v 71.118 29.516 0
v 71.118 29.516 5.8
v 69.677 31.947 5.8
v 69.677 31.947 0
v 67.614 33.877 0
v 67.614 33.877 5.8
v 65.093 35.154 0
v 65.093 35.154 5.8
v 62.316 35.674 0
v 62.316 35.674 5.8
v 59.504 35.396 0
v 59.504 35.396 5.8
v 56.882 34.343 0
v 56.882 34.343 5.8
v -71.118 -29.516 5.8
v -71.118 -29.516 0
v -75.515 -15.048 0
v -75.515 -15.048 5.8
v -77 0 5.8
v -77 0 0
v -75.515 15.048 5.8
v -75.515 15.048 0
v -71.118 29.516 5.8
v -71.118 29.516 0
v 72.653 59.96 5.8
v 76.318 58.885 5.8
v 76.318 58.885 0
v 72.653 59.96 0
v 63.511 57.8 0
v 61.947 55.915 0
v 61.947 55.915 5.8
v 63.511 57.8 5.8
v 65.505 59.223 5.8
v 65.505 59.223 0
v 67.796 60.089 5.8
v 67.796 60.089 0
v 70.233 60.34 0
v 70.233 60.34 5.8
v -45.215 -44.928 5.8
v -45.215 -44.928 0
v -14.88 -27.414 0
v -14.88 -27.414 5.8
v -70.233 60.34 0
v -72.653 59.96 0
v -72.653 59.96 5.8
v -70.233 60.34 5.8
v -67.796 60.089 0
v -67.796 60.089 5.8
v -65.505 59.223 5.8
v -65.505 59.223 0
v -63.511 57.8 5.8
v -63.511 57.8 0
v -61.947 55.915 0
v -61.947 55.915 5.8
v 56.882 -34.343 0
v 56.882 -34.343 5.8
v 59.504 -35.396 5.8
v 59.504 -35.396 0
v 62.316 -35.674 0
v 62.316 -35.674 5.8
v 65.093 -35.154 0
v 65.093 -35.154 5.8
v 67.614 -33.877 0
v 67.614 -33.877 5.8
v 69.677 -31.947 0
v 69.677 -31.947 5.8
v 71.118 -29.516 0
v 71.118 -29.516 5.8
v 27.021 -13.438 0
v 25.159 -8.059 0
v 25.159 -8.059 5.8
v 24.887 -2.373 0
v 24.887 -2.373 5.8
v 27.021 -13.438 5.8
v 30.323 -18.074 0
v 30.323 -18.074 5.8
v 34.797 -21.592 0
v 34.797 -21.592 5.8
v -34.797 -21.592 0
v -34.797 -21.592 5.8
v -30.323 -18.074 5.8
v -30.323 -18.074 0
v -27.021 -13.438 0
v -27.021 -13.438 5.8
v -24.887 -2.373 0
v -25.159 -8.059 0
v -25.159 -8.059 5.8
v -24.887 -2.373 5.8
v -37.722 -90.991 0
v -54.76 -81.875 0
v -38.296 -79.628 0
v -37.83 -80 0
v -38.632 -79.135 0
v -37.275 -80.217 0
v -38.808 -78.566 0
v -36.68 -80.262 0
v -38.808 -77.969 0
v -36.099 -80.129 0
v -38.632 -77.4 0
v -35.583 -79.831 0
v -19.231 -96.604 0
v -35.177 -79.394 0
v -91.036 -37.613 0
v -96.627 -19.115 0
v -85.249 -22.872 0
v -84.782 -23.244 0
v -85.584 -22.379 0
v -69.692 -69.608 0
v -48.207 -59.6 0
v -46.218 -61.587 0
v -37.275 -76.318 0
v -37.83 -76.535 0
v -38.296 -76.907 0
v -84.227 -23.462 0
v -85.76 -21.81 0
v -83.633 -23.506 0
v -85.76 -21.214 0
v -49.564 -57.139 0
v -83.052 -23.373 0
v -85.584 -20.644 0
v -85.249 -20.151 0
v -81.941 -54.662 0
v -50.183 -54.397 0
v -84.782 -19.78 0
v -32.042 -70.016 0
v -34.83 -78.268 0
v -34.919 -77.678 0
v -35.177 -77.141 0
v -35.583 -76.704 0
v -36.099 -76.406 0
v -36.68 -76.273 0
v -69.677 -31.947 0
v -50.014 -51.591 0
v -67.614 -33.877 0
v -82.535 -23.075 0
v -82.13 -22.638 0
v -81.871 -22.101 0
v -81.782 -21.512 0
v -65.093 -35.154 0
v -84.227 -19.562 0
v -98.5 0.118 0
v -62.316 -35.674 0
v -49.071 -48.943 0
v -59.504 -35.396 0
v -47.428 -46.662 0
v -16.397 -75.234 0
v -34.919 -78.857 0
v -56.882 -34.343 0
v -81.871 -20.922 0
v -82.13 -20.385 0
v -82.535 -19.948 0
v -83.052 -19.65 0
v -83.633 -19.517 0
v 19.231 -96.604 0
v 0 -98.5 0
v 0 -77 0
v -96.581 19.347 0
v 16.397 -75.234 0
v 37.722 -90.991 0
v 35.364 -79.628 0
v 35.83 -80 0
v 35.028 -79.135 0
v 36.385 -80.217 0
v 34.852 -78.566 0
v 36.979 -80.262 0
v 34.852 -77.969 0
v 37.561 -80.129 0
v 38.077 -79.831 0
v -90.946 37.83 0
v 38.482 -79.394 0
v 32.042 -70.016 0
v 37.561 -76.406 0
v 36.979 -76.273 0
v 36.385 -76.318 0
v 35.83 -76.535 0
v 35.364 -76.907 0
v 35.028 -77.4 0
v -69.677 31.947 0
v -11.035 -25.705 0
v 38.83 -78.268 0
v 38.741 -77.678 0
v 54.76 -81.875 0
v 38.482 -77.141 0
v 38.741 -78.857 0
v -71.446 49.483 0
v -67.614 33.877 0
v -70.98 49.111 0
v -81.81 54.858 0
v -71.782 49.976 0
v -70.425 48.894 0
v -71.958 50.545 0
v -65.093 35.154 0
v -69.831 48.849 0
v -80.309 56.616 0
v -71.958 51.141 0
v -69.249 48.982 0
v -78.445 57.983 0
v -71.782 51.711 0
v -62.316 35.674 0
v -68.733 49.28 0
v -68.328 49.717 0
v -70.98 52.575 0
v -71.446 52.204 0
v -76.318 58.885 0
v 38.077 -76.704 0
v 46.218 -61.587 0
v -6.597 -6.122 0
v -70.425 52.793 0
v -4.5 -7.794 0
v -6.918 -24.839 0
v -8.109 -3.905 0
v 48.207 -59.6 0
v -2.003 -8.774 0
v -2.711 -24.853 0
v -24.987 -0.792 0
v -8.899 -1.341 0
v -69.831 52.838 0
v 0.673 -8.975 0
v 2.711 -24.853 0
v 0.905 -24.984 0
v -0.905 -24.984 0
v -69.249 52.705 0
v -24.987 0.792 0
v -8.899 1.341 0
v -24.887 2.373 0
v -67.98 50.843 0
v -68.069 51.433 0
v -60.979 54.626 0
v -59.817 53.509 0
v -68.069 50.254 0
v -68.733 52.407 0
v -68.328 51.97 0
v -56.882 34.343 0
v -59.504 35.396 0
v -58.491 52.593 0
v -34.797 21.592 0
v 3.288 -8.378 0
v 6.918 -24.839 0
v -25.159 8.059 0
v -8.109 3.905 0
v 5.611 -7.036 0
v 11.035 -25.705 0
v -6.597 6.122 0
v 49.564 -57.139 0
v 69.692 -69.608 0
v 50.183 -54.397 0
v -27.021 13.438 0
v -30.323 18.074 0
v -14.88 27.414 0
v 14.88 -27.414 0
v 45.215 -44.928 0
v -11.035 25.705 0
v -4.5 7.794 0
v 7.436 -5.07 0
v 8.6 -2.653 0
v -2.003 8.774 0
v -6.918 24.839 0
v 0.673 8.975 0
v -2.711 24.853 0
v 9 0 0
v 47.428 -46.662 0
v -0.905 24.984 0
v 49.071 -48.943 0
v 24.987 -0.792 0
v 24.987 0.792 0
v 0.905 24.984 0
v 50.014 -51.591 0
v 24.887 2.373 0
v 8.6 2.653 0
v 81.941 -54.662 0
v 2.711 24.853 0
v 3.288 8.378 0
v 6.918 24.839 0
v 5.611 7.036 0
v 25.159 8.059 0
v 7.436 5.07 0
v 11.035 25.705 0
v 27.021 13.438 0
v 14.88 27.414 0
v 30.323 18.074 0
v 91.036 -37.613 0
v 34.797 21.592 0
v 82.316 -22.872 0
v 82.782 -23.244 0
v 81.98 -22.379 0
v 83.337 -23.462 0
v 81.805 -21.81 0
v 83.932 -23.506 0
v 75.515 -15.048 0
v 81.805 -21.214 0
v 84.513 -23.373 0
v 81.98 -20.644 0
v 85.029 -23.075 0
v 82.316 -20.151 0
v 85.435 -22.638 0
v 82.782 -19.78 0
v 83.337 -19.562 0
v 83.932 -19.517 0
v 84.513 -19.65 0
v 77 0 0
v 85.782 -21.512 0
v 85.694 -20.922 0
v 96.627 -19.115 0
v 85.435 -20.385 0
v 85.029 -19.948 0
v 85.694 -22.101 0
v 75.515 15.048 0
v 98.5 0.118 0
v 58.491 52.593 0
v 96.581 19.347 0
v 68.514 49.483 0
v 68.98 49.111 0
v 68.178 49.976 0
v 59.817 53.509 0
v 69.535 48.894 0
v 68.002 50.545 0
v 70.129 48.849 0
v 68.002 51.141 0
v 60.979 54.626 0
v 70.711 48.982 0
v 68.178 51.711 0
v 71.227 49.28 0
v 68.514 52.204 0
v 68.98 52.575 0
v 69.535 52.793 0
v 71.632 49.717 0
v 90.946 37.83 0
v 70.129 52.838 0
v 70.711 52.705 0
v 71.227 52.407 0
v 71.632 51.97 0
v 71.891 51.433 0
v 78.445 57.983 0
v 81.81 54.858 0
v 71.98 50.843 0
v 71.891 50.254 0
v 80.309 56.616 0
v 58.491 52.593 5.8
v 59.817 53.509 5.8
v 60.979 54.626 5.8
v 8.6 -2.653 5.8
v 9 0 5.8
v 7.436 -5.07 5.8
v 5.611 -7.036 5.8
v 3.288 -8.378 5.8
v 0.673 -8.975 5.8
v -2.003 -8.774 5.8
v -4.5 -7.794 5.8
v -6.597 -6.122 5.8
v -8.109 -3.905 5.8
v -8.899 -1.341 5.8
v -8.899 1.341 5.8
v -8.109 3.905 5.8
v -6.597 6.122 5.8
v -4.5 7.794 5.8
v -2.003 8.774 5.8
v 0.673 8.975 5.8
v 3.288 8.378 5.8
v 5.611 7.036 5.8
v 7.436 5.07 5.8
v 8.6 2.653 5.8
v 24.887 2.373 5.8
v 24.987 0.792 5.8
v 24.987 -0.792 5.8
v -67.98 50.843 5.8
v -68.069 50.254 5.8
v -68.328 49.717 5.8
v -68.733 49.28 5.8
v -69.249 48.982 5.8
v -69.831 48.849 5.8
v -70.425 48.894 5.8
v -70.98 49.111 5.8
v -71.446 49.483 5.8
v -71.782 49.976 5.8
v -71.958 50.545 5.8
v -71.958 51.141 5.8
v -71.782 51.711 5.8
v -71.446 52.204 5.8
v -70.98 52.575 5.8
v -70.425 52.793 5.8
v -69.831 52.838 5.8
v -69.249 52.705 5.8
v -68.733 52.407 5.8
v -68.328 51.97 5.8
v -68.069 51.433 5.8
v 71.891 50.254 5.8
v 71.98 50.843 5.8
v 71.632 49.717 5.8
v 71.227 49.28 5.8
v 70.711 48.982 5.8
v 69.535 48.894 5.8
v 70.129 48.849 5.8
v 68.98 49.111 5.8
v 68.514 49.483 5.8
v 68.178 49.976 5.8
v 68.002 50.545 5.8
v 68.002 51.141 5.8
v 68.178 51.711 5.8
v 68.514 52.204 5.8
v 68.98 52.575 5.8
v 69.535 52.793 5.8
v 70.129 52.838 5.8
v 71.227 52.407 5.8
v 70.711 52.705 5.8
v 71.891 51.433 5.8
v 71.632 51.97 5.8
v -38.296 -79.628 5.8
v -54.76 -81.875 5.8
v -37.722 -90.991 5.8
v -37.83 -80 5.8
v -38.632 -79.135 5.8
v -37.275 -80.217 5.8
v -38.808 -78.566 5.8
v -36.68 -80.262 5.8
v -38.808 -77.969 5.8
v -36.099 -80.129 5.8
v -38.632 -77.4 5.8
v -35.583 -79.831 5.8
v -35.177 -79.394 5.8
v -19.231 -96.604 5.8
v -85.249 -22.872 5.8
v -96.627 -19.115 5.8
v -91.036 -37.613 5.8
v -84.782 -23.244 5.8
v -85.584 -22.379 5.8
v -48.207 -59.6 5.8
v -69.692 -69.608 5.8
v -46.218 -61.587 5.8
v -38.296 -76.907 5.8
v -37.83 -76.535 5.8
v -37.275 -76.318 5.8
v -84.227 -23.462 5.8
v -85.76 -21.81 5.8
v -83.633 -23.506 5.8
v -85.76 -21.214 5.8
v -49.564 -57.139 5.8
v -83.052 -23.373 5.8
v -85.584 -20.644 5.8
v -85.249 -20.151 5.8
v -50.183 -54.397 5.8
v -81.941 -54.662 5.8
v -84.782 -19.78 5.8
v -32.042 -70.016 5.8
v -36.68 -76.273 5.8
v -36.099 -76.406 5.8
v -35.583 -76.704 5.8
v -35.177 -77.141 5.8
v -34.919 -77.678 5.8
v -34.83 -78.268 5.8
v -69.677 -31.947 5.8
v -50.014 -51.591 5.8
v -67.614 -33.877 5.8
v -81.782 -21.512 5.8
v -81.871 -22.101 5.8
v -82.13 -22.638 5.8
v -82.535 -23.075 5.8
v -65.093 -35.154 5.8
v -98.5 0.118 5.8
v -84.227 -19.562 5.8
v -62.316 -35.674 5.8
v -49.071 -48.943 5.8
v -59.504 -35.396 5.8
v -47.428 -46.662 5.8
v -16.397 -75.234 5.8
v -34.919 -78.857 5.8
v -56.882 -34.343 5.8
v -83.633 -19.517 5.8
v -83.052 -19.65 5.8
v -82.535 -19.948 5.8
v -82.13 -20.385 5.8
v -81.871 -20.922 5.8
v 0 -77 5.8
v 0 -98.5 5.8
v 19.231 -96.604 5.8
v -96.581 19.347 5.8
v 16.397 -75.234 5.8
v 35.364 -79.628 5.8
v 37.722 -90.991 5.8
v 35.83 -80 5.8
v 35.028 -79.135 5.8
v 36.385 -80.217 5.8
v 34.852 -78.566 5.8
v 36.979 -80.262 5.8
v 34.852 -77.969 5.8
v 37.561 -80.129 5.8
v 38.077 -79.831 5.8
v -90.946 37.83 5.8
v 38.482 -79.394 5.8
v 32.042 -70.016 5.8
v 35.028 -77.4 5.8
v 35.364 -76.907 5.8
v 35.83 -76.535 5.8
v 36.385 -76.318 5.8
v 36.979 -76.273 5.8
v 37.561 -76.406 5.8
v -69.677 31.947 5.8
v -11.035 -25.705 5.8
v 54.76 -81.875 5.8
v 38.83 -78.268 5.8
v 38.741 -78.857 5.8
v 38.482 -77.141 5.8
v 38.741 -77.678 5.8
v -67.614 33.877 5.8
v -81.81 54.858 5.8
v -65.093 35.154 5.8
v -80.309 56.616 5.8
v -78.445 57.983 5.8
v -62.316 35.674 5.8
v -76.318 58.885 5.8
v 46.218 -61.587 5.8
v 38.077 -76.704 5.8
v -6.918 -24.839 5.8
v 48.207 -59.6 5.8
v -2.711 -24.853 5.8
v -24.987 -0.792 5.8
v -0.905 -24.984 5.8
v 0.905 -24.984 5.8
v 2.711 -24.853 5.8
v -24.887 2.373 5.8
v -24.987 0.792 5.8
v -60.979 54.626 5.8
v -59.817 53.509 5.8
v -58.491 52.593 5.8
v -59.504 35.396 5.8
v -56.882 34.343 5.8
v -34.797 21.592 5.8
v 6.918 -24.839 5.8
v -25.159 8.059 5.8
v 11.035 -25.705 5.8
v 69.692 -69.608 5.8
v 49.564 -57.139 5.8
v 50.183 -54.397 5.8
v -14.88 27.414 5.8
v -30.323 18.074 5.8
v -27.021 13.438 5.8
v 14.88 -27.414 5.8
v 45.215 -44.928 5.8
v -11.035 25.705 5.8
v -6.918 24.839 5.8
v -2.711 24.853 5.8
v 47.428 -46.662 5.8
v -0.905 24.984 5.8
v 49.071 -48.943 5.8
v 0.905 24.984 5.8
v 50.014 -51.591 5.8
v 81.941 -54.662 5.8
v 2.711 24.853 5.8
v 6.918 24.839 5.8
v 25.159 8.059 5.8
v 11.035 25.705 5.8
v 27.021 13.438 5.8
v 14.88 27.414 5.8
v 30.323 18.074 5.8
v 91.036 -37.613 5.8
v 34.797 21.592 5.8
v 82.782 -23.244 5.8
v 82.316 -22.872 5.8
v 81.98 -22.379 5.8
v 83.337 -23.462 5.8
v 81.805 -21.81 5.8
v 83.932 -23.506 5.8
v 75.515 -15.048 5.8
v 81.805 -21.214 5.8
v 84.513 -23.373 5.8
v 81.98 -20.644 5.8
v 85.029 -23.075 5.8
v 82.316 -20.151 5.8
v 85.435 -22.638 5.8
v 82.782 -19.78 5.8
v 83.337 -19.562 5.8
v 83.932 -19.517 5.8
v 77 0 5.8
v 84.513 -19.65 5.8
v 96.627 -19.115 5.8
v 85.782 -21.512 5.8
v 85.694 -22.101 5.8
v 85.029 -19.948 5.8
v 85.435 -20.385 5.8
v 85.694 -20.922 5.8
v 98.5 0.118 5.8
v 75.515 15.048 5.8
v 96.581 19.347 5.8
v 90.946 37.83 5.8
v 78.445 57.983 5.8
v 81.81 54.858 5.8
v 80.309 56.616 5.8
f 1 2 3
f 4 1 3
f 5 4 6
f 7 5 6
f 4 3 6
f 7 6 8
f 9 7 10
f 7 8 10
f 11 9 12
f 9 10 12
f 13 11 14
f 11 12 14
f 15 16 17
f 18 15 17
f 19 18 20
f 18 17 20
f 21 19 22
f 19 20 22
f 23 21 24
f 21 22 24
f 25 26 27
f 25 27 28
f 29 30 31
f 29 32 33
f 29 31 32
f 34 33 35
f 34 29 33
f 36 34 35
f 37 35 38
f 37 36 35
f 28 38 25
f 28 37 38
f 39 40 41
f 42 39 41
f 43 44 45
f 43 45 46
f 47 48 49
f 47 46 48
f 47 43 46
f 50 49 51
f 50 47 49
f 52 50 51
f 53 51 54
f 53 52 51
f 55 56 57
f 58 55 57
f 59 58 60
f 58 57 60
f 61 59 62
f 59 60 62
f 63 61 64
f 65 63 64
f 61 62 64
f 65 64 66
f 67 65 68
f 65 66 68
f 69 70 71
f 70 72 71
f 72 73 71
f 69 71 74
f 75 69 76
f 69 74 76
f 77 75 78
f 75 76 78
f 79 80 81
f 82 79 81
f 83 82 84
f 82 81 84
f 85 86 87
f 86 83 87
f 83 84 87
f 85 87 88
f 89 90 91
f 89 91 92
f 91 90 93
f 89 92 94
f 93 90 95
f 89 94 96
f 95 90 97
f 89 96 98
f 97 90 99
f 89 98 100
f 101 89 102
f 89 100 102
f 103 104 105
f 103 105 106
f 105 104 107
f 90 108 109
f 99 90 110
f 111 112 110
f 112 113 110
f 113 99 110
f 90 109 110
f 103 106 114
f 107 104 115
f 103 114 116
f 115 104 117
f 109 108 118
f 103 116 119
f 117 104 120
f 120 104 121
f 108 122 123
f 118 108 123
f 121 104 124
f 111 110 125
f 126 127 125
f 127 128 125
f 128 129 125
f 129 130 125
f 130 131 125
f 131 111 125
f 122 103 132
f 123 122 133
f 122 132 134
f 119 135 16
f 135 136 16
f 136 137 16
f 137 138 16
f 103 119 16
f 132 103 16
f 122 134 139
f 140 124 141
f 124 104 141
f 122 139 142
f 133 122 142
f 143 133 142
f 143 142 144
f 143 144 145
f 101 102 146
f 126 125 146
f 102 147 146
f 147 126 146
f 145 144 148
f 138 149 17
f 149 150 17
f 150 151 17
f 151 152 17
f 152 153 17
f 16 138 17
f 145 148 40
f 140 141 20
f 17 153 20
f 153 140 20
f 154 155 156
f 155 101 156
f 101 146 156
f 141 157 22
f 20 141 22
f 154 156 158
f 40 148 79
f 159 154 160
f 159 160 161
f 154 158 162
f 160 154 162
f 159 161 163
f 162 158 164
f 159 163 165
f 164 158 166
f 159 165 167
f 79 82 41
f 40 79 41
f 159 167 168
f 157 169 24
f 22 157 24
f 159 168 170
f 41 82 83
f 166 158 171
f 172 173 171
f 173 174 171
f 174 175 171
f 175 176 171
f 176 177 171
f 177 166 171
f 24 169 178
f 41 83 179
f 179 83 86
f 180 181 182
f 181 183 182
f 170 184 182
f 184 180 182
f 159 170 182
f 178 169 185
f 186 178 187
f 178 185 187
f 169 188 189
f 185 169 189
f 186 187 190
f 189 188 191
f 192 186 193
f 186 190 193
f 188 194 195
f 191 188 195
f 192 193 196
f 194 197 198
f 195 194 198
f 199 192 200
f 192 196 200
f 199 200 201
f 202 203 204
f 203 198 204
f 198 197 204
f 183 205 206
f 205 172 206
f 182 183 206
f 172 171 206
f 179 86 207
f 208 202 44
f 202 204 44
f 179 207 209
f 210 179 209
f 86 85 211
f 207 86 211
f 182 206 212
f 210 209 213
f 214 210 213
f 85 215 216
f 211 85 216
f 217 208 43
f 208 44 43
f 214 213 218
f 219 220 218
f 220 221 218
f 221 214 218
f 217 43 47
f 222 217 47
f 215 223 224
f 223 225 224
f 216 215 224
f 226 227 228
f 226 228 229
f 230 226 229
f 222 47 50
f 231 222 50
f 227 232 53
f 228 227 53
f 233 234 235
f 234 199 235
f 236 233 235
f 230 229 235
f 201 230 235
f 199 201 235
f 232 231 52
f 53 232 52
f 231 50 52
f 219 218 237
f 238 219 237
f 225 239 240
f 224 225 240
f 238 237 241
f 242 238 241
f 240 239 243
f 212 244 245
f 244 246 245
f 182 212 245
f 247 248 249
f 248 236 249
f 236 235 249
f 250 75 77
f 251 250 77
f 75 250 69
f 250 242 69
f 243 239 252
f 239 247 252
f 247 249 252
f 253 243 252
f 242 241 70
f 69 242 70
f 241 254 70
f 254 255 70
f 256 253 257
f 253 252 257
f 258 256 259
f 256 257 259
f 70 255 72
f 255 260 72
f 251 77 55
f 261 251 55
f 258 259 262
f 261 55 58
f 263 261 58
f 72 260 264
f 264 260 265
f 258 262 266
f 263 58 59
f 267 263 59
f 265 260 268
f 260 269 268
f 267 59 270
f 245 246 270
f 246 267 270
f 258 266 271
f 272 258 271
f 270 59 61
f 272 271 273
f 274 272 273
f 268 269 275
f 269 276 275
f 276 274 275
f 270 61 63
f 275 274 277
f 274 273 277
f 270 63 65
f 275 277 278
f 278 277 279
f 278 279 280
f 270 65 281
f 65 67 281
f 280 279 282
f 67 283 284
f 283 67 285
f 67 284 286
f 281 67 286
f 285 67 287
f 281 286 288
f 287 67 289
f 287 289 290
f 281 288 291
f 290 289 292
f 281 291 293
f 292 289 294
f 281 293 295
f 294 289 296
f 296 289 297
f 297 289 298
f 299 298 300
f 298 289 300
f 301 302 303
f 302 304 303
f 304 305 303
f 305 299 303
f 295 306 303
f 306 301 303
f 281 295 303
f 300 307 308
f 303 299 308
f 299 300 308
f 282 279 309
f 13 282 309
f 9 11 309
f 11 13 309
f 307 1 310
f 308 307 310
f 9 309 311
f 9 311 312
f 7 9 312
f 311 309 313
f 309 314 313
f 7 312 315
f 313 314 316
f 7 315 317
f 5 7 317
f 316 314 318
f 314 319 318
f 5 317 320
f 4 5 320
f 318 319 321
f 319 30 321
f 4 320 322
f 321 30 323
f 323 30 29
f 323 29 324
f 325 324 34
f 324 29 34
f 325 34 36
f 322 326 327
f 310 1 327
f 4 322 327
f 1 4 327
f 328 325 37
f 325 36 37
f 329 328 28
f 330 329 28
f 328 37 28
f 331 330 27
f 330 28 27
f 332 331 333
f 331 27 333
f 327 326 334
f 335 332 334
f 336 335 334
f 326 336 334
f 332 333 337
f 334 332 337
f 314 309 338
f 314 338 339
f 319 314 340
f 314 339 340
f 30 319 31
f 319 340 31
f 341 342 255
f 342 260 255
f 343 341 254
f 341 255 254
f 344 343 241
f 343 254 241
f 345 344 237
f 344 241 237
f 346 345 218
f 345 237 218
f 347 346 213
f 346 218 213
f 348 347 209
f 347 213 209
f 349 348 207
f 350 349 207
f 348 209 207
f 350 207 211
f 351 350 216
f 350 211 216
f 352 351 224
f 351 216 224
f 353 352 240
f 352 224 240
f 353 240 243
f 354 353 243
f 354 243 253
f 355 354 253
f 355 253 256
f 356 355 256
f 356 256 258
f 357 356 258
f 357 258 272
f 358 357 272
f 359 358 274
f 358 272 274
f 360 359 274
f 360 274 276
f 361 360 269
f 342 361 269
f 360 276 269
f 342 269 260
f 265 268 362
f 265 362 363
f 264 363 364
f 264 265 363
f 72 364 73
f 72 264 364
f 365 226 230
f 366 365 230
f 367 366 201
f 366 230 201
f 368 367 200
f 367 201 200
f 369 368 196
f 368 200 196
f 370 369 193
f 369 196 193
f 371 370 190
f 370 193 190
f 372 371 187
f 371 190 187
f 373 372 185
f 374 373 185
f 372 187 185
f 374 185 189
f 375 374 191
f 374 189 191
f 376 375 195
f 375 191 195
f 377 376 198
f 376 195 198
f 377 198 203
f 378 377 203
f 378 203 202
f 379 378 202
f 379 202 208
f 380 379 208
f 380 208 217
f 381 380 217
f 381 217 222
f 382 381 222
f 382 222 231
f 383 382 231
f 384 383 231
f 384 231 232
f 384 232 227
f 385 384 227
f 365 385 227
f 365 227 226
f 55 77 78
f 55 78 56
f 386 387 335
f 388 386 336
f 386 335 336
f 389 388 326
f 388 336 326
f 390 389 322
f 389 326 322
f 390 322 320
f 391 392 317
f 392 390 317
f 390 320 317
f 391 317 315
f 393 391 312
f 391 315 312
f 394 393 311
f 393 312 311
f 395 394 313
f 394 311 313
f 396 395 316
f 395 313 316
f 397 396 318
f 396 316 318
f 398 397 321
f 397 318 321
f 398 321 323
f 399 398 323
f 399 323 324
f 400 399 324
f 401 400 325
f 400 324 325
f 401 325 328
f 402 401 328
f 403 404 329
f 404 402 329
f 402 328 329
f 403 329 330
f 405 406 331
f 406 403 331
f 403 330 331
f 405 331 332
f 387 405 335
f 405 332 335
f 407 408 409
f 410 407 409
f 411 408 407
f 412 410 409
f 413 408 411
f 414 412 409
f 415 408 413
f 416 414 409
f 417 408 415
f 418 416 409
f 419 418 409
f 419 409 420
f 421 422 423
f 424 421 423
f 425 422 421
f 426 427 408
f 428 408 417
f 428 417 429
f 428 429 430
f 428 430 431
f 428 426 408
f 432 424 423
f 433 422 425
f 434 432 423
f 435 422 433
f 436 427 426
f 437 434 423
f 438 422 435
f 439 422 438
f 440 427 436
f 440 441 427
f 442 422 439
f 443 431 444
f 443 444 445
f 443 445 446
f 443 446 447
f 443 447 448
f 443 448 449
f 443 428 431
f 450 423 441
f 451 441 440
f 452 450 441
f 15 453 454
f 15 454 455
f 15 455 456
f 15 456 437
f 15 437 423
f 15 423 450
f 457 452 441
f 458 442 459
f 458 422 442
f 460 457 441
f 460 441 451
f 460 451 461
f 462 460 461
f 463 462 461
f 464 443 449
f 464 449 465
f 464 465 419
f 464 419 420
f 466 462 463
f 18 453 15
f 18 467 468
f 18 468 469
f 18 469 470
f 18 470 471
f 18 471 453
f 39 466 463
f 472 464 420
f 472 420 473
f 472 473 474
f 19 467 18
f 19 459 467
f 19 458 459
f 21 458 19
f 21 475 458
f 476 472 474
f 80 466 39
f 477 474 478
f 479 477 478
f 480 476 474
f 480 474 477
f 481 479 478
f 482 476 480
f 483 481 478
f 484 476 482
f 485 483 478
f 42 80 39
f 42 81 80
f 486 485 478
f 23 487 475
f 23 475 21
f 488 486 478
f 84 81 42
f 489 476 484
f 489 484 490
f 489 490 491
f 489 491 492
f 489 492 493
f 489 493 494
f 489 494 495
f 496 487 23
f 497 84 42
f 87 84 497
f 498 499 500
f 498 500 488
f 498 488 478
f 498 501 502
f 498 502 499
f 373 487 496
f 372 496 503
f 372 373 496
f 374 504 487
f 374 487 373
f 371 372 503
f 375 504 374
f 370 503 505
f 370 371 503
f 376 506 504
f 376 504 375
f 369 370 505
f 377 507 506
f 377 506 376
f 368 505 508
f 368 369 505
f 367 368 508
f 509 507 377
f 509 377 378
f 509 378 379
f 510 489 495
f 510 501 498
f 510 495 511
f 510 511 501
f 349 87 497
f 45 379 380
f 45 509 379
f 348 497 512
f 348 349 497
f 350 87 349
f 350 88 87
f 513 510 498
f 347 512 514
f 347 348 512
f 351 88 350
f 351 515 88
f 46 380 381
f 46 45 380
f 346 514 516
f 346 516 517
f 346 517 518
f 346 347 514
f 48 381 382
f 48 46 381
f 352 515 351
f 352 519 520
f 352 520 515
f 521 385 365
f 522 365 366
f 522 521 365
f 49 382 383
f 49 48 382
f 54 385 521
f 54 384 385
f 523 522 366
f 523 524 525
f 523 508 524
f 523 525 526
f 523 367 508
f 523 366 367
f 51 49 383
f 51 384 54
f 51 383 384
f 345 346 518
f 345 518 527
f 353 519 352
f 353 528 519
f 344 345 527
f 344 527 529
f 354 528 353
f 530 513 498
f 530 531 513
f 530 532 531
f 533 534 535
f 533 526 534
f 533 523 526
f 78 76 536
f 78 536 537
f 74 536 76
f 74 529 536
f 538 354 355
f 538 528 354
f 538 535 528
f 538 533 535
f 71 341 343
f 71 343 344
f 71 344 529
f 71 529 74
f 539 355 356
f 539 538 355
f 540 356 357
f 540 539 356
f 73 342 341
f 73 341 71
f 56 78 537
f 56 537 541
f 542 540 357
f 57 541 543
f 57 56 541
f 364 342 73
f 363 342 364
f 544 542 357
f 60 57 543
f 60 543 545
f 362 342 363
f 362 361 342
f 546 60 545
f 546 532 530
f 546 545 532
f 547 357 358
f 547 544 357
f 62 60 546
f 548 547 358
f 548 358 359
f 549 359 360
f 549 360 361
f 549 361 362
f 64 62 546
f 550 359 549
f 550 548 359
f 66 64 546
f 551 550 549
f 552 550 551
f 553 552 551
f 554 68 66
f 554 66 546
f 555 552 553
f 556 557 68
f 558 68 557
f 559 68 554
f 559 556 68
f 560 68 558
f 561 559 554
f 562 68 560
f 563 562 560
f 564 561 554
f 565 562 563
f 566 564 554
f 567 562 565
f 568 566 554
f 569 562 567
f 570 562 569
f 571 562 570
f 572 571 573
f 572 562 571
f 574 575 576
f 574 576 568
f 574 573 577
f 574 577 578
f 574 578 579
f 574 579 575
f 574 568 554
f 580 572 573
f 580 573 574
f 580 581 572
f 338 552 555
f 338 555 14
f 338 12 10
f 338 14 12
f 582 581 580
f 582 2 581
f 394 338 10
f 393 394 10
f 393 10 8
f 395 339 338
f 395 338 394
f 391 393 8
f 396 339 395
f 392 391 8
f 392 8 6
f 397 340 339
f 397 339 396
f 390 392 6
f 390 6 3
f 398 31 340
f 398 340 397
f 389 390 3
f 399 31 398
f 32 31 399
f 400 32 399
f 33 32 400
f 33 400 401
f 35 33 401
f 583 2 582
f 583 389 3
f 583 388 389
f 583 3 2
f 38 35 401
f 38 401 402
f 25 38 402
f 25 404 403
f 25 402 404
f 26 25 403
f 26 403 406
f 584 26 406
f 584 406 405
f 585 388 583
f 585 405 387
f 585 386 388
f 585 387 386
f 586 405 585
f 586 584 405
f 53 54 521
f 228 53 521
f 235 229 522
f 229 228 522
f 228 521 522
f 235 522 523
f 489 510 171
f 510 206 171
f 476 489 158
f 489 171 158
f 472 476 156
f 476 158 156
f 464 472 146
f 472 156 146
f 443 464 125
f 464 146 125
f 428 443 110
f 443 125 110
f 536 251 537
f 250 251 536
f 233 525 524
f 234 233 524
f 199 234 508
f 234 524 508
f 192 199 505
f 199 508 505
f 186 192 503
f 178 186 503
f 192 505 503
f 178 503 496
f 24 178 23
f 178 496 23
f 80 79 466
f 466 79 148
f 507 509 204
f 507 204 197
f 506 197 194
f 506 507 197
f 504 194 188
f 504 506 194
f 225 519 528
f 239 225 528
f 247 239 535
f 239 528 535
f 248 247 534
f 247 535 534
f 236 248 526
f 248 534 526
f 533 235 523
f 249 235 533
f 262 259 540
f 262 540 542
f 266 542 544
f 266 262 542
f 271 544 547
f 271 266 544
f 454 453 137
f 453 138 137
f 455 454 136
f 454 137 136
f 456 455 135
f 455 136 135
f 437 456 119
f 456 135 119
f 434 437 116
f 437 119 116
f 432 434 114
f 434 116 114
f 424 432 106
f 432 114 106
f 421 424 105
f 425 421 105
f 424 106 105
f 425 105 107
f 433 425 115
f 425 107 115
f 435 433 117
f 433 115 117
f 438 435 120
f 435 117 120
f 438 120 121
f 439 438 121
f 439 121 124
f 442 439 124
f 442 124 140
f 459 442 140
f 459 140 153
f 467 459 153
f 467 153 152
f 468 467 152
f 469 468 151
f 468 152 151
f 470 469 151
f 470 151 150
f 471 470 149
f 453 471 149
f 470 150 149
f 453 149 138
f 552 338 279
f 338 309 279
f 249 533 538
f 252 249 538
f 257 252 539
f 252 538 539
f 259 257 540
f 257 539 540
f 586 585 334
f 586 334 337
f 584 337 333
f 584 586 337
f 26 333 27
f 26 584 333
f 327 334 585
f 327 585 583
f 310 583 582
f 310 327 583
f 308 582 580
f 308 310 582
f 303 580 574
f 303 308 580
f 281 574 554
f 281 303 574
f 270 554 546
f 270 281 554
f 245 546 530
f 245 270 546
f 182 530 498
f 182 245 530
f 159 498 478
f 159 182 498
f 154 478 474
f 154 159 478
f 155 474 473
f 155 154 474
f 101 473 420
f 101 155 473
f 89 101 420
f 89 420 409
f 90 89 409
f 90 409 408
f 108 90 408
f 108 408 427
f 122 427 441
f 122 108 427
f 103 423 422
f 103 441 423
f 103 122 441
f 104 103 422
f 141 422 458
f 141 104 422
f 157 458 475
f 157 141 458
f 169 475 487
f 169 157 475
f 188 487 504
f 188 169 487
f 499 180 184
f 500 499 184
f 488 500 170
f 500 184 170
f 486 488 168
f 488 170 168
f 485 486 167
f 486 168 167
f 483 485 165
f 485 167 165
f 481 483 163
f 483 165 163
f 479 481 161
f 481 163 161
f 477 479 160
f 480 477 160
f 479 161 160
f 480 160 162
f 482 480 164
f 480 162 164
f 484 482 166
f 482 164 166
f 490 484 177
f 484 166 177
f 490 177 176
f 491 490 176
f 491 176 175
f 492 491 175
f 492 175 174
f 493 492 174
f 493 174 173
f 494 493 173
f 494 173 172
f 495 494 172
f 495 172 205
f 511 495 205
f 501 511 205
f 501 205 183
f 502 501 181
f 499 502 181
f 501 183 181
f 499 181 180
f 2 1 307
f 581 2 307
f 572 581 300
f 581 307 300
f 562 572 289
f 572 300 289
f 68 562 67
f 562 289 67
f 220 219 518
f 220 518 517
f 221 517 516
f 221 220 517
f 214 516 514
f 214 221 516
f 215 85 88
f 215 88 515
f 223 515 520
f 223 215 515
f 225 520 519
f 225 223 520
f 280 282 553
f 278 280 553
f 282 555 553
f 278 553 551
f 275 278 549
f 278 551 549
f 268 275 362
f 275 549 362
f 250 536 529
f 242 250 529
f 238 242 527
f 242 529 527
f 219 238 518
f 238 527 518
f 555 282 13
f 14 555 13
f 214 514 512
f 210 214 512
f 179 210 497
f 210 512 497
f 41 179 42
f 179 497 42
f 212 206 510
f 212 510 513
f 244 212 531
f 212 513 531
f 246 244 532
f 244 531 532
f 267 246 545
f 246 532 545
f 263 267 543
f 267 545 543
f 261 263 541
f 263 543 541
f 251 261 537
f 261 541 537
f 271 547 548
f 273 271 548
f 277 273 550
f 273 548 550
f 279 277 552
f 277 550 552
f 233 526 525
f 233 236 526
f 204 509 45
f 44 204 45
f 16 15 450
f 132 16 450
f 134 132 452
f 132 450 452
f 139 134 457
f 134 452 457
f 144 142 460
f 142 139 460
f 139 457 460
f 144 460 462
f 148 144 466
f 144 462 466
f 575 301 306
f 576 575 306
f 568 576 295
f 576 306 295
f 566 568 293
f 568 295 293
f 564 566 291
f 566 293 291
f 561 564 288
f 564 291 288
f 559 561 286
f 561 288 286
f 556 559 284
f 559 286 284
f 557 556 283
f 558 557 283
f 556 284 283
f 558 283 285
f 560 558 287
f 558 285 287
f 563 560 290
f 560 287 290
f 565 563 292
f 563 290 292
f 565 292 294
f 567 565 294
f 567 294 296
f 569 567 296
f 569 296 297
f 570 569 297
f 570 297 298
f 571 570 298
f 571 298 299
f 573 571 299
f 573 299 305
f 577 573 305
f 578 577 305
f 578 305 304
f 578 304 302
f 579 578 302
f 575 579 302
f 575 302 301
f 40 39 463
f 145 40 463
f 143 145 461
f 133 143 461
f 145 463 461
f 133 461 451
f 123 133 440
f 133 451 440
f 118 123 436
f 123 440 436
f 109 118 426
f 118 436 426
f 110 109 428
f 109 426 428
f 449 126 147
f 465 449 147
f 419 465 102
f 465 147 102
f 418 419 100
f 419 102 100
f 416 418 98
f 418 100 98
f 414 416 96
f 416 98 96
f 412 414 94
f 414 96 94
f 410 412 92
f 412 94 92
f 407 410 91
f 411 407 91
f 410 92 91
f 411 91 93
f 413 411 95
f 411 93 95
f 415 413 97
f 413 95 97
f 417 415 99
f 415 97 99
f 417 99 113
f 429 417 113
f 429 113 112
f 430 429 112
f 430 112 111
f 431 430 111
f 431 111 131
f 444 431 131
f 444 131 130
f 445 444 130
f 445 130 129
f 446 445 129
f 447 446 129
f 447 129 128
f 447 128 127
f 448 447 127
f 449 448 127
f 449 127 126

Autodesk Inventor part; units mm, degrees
ref_plane "YZ Plane" through (0, 0, 0) normal (1, 0, 0) x (0, 1, 0)
ref_plane "XZ Plane" through (0, 0, 0) normal (0, 1, 0) x (-1, 0, 0)
ref_plane "XY Plane" through (0, 0, 0) normal (0, 0, 1) x (1, 0, 0)
sketch "スケッチ1" plane through (0, 0, 0) normal (0, 0, 1) x (1, 0, 0)
  circle A0 centre (69, 50) radius 2
  circle A1 centre (0, 0) radius 9
  circle A2 centre (0, 0) radius 25
  circle A3 centre (69, 50) radius 7.5
  line L0 (65.25, 56.4952) -> (8.2643, 23.5945)
  line L1 (0, 25) -> (0, -25)
  line L2 (-25, 0) -> (25, 0)
  line L3 (20.9707, 13.61) -> (72.75, 43.5048)
  circle A4 centre (69, -50) radius 2
  circle A5 centre (69, -50) radius 7.5
  line L4 (65.25, -56.4952) -> (8.2643, -23.5945)
  line L5 (20.9707, -13.61) -> (72.75, -43.5048)
  circle A6 centre (-69, 50) radius 2
  circle A7 centre (-69, 50) radius 7.5
  line L6 (-65.25, 56.4952) -> (-8.2643, 23.5945)
  line L7 (-20.9707, 13.61) -> (-72.75, 43.5048)
  line L8 (-65.25, -56.4952) -> (-8.2643, -23.5945)
  circle A8 centre (-69, -50) radius 7.5
  circle A9 centre (-69, -50) radius 2
  line L9 (-20.9707, -13.61) -> (-72.75, -43.5048)
  circle A10 centre (0, 0) radius 77
  circle A11 centre (0, 0) radius 86.5
  circle A12 centre (0, 0) radius 98.5
  line L10 (0, 0) -> (79.6882, 57.8968)
  line L11 (0, 0) -> (95.4054, -24.496)
  line L12 (0, 0) -> (41.9393, -89.1255)
  line L13 (0, 0) -> (-79.6882, 57.8968)
  line L14 (0, 0) -> (-95.4054, -24.496)
  line L15 (0, 0) -> (-41.9393, -89.1255)
  circle A13 centre (69.98, 50.8434) radius 2
  circle A14 centre (83.7824, -21.5117) radius 2
  circle A15 centre (36.8299, -78.2675) radius 2
  circle A16 centre (69.98, 50.8434) radius 9.5
  circle A17 centre (-69.98, 50.8434) radius 2
  circle A18 centre (-83.7824, -21.5117) radius 2
  circle A19 centre (-36.8299, -78.2675) radius 2
  circle A20 centre (-69.98, 50.8434) radius 9.5
  line L16 (-79.6882, 57.8968) -> (-72.6529, 59.9596)
  line L17 (79.6882, 57.8968) -> (72.6529, 59.9596)
  point P0 (-8.2643, 23.5945)
  point P1 (-8.2643, -23.5945)
  point P2 (8.2643, -23.5945)
  point P3 (66.0238, -39.6214)
  point P4 (57.0218, -51.7447)
  point P5 (-57.0218, -51.7447)
  point P6 (-66.0238, -39.6214)
  point P7 (-66.0238, 39.6214)
  point P8 (-57.0218, 51.7447)
  point P9 (-62.2943, 45.2595)
  point P10 (-77.6656, 56.4274)
  point P11 (77.6656, 56.4274)
  point P12 (62.2943, 45.2595)
  point P13 (57.0218, 51.7447)
  point P14 (66.0238, 39.6214)
  point P15 (-61.0434, 54.0665)
  point P16 (61.0434, 54.0665)
  point P17 (69.0803, 41.3861)
  point P18 (-69.0803, 41.3861)
  point P19 (-12.1615, -25.8445)
  point P20 (-10.6445, -22.6207)
  point P21 (10.6445, -22.6207)
  point P22 (12.1615, -25.8445)
  dimension "d19" = 19
  dimension "d0" = 4
  dimension "d1" = 50
  dimension "d2" = 69
  dimension "d3" = 18
  dimension "d4" = 50
  dimension "d5" = 15
  dimension "d6" = 30
  dimension "d10" = 154
  dimension "d11" = 173
  dimension "d12" = 197
  dimension "d13" = 54
  dimension "d14" = 50.4
  dimension "d15" = 50.4
  dimension "d16" = 4
  dimension "d17" = 4
  dimension "d18" = 4
extrude "押し出し1" add sketch "スケッチ1" along normal blind 5.8 contours A13 A11 A3 L10 | L10 A3 A11 A13 | A13 A11 A3 L10 A0 | A0 L10 A13 | A13 L10 A0 | A0 L10 A3 A11 A13 | L10 A16 A11 A3 | A3 A11 A16 L10 | A11 A16 L3 A3 | A3 L0 A16 A11 | A16 L17 L10 | L10 A12 L11 A14 A11 A16 | L10 A16 L0 A3 | A3 L3 A16 L10 | A11 A14 L11 A10 L3 A16 | A16 L3 A10 | L10 A2 L0 A10 | A10 L3 A2 L10 | A10 L0 A16 | A20 L6 A7 A11 | A11 A7 L13 A20 | L13 A20 A11 A18 L14 A12 | L16 A20 L13 | L10 A1 L1 A2 | A2 L2 A1 L10 | A11 A17 L13 A7 | A7 L13 A6 A17 A11 | A20 L13 A7 L6 | L6 A10 A20 | A12 L12 A15 A11 A5 A14 L11 | L14 A18 A11 A8 A19 L15 A12 | L13 A7 A11 A20 | L6 A2 L13 A10 | A14 A11 A5 L5 A10 L11 | L13 A17 A11 A7 | A12 L15 A19 A11 A15 L12 | A20 L7 A10 L14 A18 A11 | A11 A7 L7 A20 | A2 L11 A1 L2 | L1 A1 L13 A2 | L13 A2 L7 A10 | A20 L7 A7 L13 | A10 L7 A20 | A11 A17 A6 L13 A7 | A6 L13 A17 | A18 L14 A10 L9 A8 A11 | A2 L12 A1 L11 | A10 L4 L12 A2 L5 | L5 A5 L4 A10 | L13 A1 L2 A2 | L1 A2 L15 A1 | A1 L12 A2 L1 | A1 L14 A2 L2 | A1 L15 A2 L14 | A11 A4 A5 | A5 A11 A4 | A11 A19 L15 A10 L12 A15 | A11 A8 L8 A10 L15 A19 | A11 A9 A8 | A8 A11 A9 | L4 A5 A11 A15 L12 A10 | A6 A17 L13 | L12 L4 A2 | L15 L8 A10 L9 A2 | A2 L8 L15 | A11 A4 | A4 A11 | L9 A10 L8 A8 | A11 A9 | A9 A11
fillet "フィレット1" radius 20 8 edges at (-8.2643, 23.5945, 2.9) (8.2643, 23.5945, 2.9) (-8.2643, -23.5945, 2.9) (8.2643, -23.5945, 2.9) (-20.9707, -13.61, 2.9) (-20.9707, 13.61, 2.9) (20.9707, 13.61, 2.9) (20.9707, -13.61, 2.9)
fillet "フィレット2" radius 10 10 edges at (-61.0434, 54.0665, 2.9) (61.0434, 54.0665, 2.9) (66.0238, 39.6214, 2.9) (66.0238, -39.6214, 2.9) (57.0218, -51.7447, 2.9) (-57.0218, -51.7447, 2.9) (-66.0238, -39.6214, 2.9) (-66.0238, 39.6214, 2.9) (79.6882, 57.8968, 2.9) (-79.6882, 57.8968, 2.9)
equation "\"d15\" = d14"
properties part number "TH22_POM_X" material "ABS プラスチック"
